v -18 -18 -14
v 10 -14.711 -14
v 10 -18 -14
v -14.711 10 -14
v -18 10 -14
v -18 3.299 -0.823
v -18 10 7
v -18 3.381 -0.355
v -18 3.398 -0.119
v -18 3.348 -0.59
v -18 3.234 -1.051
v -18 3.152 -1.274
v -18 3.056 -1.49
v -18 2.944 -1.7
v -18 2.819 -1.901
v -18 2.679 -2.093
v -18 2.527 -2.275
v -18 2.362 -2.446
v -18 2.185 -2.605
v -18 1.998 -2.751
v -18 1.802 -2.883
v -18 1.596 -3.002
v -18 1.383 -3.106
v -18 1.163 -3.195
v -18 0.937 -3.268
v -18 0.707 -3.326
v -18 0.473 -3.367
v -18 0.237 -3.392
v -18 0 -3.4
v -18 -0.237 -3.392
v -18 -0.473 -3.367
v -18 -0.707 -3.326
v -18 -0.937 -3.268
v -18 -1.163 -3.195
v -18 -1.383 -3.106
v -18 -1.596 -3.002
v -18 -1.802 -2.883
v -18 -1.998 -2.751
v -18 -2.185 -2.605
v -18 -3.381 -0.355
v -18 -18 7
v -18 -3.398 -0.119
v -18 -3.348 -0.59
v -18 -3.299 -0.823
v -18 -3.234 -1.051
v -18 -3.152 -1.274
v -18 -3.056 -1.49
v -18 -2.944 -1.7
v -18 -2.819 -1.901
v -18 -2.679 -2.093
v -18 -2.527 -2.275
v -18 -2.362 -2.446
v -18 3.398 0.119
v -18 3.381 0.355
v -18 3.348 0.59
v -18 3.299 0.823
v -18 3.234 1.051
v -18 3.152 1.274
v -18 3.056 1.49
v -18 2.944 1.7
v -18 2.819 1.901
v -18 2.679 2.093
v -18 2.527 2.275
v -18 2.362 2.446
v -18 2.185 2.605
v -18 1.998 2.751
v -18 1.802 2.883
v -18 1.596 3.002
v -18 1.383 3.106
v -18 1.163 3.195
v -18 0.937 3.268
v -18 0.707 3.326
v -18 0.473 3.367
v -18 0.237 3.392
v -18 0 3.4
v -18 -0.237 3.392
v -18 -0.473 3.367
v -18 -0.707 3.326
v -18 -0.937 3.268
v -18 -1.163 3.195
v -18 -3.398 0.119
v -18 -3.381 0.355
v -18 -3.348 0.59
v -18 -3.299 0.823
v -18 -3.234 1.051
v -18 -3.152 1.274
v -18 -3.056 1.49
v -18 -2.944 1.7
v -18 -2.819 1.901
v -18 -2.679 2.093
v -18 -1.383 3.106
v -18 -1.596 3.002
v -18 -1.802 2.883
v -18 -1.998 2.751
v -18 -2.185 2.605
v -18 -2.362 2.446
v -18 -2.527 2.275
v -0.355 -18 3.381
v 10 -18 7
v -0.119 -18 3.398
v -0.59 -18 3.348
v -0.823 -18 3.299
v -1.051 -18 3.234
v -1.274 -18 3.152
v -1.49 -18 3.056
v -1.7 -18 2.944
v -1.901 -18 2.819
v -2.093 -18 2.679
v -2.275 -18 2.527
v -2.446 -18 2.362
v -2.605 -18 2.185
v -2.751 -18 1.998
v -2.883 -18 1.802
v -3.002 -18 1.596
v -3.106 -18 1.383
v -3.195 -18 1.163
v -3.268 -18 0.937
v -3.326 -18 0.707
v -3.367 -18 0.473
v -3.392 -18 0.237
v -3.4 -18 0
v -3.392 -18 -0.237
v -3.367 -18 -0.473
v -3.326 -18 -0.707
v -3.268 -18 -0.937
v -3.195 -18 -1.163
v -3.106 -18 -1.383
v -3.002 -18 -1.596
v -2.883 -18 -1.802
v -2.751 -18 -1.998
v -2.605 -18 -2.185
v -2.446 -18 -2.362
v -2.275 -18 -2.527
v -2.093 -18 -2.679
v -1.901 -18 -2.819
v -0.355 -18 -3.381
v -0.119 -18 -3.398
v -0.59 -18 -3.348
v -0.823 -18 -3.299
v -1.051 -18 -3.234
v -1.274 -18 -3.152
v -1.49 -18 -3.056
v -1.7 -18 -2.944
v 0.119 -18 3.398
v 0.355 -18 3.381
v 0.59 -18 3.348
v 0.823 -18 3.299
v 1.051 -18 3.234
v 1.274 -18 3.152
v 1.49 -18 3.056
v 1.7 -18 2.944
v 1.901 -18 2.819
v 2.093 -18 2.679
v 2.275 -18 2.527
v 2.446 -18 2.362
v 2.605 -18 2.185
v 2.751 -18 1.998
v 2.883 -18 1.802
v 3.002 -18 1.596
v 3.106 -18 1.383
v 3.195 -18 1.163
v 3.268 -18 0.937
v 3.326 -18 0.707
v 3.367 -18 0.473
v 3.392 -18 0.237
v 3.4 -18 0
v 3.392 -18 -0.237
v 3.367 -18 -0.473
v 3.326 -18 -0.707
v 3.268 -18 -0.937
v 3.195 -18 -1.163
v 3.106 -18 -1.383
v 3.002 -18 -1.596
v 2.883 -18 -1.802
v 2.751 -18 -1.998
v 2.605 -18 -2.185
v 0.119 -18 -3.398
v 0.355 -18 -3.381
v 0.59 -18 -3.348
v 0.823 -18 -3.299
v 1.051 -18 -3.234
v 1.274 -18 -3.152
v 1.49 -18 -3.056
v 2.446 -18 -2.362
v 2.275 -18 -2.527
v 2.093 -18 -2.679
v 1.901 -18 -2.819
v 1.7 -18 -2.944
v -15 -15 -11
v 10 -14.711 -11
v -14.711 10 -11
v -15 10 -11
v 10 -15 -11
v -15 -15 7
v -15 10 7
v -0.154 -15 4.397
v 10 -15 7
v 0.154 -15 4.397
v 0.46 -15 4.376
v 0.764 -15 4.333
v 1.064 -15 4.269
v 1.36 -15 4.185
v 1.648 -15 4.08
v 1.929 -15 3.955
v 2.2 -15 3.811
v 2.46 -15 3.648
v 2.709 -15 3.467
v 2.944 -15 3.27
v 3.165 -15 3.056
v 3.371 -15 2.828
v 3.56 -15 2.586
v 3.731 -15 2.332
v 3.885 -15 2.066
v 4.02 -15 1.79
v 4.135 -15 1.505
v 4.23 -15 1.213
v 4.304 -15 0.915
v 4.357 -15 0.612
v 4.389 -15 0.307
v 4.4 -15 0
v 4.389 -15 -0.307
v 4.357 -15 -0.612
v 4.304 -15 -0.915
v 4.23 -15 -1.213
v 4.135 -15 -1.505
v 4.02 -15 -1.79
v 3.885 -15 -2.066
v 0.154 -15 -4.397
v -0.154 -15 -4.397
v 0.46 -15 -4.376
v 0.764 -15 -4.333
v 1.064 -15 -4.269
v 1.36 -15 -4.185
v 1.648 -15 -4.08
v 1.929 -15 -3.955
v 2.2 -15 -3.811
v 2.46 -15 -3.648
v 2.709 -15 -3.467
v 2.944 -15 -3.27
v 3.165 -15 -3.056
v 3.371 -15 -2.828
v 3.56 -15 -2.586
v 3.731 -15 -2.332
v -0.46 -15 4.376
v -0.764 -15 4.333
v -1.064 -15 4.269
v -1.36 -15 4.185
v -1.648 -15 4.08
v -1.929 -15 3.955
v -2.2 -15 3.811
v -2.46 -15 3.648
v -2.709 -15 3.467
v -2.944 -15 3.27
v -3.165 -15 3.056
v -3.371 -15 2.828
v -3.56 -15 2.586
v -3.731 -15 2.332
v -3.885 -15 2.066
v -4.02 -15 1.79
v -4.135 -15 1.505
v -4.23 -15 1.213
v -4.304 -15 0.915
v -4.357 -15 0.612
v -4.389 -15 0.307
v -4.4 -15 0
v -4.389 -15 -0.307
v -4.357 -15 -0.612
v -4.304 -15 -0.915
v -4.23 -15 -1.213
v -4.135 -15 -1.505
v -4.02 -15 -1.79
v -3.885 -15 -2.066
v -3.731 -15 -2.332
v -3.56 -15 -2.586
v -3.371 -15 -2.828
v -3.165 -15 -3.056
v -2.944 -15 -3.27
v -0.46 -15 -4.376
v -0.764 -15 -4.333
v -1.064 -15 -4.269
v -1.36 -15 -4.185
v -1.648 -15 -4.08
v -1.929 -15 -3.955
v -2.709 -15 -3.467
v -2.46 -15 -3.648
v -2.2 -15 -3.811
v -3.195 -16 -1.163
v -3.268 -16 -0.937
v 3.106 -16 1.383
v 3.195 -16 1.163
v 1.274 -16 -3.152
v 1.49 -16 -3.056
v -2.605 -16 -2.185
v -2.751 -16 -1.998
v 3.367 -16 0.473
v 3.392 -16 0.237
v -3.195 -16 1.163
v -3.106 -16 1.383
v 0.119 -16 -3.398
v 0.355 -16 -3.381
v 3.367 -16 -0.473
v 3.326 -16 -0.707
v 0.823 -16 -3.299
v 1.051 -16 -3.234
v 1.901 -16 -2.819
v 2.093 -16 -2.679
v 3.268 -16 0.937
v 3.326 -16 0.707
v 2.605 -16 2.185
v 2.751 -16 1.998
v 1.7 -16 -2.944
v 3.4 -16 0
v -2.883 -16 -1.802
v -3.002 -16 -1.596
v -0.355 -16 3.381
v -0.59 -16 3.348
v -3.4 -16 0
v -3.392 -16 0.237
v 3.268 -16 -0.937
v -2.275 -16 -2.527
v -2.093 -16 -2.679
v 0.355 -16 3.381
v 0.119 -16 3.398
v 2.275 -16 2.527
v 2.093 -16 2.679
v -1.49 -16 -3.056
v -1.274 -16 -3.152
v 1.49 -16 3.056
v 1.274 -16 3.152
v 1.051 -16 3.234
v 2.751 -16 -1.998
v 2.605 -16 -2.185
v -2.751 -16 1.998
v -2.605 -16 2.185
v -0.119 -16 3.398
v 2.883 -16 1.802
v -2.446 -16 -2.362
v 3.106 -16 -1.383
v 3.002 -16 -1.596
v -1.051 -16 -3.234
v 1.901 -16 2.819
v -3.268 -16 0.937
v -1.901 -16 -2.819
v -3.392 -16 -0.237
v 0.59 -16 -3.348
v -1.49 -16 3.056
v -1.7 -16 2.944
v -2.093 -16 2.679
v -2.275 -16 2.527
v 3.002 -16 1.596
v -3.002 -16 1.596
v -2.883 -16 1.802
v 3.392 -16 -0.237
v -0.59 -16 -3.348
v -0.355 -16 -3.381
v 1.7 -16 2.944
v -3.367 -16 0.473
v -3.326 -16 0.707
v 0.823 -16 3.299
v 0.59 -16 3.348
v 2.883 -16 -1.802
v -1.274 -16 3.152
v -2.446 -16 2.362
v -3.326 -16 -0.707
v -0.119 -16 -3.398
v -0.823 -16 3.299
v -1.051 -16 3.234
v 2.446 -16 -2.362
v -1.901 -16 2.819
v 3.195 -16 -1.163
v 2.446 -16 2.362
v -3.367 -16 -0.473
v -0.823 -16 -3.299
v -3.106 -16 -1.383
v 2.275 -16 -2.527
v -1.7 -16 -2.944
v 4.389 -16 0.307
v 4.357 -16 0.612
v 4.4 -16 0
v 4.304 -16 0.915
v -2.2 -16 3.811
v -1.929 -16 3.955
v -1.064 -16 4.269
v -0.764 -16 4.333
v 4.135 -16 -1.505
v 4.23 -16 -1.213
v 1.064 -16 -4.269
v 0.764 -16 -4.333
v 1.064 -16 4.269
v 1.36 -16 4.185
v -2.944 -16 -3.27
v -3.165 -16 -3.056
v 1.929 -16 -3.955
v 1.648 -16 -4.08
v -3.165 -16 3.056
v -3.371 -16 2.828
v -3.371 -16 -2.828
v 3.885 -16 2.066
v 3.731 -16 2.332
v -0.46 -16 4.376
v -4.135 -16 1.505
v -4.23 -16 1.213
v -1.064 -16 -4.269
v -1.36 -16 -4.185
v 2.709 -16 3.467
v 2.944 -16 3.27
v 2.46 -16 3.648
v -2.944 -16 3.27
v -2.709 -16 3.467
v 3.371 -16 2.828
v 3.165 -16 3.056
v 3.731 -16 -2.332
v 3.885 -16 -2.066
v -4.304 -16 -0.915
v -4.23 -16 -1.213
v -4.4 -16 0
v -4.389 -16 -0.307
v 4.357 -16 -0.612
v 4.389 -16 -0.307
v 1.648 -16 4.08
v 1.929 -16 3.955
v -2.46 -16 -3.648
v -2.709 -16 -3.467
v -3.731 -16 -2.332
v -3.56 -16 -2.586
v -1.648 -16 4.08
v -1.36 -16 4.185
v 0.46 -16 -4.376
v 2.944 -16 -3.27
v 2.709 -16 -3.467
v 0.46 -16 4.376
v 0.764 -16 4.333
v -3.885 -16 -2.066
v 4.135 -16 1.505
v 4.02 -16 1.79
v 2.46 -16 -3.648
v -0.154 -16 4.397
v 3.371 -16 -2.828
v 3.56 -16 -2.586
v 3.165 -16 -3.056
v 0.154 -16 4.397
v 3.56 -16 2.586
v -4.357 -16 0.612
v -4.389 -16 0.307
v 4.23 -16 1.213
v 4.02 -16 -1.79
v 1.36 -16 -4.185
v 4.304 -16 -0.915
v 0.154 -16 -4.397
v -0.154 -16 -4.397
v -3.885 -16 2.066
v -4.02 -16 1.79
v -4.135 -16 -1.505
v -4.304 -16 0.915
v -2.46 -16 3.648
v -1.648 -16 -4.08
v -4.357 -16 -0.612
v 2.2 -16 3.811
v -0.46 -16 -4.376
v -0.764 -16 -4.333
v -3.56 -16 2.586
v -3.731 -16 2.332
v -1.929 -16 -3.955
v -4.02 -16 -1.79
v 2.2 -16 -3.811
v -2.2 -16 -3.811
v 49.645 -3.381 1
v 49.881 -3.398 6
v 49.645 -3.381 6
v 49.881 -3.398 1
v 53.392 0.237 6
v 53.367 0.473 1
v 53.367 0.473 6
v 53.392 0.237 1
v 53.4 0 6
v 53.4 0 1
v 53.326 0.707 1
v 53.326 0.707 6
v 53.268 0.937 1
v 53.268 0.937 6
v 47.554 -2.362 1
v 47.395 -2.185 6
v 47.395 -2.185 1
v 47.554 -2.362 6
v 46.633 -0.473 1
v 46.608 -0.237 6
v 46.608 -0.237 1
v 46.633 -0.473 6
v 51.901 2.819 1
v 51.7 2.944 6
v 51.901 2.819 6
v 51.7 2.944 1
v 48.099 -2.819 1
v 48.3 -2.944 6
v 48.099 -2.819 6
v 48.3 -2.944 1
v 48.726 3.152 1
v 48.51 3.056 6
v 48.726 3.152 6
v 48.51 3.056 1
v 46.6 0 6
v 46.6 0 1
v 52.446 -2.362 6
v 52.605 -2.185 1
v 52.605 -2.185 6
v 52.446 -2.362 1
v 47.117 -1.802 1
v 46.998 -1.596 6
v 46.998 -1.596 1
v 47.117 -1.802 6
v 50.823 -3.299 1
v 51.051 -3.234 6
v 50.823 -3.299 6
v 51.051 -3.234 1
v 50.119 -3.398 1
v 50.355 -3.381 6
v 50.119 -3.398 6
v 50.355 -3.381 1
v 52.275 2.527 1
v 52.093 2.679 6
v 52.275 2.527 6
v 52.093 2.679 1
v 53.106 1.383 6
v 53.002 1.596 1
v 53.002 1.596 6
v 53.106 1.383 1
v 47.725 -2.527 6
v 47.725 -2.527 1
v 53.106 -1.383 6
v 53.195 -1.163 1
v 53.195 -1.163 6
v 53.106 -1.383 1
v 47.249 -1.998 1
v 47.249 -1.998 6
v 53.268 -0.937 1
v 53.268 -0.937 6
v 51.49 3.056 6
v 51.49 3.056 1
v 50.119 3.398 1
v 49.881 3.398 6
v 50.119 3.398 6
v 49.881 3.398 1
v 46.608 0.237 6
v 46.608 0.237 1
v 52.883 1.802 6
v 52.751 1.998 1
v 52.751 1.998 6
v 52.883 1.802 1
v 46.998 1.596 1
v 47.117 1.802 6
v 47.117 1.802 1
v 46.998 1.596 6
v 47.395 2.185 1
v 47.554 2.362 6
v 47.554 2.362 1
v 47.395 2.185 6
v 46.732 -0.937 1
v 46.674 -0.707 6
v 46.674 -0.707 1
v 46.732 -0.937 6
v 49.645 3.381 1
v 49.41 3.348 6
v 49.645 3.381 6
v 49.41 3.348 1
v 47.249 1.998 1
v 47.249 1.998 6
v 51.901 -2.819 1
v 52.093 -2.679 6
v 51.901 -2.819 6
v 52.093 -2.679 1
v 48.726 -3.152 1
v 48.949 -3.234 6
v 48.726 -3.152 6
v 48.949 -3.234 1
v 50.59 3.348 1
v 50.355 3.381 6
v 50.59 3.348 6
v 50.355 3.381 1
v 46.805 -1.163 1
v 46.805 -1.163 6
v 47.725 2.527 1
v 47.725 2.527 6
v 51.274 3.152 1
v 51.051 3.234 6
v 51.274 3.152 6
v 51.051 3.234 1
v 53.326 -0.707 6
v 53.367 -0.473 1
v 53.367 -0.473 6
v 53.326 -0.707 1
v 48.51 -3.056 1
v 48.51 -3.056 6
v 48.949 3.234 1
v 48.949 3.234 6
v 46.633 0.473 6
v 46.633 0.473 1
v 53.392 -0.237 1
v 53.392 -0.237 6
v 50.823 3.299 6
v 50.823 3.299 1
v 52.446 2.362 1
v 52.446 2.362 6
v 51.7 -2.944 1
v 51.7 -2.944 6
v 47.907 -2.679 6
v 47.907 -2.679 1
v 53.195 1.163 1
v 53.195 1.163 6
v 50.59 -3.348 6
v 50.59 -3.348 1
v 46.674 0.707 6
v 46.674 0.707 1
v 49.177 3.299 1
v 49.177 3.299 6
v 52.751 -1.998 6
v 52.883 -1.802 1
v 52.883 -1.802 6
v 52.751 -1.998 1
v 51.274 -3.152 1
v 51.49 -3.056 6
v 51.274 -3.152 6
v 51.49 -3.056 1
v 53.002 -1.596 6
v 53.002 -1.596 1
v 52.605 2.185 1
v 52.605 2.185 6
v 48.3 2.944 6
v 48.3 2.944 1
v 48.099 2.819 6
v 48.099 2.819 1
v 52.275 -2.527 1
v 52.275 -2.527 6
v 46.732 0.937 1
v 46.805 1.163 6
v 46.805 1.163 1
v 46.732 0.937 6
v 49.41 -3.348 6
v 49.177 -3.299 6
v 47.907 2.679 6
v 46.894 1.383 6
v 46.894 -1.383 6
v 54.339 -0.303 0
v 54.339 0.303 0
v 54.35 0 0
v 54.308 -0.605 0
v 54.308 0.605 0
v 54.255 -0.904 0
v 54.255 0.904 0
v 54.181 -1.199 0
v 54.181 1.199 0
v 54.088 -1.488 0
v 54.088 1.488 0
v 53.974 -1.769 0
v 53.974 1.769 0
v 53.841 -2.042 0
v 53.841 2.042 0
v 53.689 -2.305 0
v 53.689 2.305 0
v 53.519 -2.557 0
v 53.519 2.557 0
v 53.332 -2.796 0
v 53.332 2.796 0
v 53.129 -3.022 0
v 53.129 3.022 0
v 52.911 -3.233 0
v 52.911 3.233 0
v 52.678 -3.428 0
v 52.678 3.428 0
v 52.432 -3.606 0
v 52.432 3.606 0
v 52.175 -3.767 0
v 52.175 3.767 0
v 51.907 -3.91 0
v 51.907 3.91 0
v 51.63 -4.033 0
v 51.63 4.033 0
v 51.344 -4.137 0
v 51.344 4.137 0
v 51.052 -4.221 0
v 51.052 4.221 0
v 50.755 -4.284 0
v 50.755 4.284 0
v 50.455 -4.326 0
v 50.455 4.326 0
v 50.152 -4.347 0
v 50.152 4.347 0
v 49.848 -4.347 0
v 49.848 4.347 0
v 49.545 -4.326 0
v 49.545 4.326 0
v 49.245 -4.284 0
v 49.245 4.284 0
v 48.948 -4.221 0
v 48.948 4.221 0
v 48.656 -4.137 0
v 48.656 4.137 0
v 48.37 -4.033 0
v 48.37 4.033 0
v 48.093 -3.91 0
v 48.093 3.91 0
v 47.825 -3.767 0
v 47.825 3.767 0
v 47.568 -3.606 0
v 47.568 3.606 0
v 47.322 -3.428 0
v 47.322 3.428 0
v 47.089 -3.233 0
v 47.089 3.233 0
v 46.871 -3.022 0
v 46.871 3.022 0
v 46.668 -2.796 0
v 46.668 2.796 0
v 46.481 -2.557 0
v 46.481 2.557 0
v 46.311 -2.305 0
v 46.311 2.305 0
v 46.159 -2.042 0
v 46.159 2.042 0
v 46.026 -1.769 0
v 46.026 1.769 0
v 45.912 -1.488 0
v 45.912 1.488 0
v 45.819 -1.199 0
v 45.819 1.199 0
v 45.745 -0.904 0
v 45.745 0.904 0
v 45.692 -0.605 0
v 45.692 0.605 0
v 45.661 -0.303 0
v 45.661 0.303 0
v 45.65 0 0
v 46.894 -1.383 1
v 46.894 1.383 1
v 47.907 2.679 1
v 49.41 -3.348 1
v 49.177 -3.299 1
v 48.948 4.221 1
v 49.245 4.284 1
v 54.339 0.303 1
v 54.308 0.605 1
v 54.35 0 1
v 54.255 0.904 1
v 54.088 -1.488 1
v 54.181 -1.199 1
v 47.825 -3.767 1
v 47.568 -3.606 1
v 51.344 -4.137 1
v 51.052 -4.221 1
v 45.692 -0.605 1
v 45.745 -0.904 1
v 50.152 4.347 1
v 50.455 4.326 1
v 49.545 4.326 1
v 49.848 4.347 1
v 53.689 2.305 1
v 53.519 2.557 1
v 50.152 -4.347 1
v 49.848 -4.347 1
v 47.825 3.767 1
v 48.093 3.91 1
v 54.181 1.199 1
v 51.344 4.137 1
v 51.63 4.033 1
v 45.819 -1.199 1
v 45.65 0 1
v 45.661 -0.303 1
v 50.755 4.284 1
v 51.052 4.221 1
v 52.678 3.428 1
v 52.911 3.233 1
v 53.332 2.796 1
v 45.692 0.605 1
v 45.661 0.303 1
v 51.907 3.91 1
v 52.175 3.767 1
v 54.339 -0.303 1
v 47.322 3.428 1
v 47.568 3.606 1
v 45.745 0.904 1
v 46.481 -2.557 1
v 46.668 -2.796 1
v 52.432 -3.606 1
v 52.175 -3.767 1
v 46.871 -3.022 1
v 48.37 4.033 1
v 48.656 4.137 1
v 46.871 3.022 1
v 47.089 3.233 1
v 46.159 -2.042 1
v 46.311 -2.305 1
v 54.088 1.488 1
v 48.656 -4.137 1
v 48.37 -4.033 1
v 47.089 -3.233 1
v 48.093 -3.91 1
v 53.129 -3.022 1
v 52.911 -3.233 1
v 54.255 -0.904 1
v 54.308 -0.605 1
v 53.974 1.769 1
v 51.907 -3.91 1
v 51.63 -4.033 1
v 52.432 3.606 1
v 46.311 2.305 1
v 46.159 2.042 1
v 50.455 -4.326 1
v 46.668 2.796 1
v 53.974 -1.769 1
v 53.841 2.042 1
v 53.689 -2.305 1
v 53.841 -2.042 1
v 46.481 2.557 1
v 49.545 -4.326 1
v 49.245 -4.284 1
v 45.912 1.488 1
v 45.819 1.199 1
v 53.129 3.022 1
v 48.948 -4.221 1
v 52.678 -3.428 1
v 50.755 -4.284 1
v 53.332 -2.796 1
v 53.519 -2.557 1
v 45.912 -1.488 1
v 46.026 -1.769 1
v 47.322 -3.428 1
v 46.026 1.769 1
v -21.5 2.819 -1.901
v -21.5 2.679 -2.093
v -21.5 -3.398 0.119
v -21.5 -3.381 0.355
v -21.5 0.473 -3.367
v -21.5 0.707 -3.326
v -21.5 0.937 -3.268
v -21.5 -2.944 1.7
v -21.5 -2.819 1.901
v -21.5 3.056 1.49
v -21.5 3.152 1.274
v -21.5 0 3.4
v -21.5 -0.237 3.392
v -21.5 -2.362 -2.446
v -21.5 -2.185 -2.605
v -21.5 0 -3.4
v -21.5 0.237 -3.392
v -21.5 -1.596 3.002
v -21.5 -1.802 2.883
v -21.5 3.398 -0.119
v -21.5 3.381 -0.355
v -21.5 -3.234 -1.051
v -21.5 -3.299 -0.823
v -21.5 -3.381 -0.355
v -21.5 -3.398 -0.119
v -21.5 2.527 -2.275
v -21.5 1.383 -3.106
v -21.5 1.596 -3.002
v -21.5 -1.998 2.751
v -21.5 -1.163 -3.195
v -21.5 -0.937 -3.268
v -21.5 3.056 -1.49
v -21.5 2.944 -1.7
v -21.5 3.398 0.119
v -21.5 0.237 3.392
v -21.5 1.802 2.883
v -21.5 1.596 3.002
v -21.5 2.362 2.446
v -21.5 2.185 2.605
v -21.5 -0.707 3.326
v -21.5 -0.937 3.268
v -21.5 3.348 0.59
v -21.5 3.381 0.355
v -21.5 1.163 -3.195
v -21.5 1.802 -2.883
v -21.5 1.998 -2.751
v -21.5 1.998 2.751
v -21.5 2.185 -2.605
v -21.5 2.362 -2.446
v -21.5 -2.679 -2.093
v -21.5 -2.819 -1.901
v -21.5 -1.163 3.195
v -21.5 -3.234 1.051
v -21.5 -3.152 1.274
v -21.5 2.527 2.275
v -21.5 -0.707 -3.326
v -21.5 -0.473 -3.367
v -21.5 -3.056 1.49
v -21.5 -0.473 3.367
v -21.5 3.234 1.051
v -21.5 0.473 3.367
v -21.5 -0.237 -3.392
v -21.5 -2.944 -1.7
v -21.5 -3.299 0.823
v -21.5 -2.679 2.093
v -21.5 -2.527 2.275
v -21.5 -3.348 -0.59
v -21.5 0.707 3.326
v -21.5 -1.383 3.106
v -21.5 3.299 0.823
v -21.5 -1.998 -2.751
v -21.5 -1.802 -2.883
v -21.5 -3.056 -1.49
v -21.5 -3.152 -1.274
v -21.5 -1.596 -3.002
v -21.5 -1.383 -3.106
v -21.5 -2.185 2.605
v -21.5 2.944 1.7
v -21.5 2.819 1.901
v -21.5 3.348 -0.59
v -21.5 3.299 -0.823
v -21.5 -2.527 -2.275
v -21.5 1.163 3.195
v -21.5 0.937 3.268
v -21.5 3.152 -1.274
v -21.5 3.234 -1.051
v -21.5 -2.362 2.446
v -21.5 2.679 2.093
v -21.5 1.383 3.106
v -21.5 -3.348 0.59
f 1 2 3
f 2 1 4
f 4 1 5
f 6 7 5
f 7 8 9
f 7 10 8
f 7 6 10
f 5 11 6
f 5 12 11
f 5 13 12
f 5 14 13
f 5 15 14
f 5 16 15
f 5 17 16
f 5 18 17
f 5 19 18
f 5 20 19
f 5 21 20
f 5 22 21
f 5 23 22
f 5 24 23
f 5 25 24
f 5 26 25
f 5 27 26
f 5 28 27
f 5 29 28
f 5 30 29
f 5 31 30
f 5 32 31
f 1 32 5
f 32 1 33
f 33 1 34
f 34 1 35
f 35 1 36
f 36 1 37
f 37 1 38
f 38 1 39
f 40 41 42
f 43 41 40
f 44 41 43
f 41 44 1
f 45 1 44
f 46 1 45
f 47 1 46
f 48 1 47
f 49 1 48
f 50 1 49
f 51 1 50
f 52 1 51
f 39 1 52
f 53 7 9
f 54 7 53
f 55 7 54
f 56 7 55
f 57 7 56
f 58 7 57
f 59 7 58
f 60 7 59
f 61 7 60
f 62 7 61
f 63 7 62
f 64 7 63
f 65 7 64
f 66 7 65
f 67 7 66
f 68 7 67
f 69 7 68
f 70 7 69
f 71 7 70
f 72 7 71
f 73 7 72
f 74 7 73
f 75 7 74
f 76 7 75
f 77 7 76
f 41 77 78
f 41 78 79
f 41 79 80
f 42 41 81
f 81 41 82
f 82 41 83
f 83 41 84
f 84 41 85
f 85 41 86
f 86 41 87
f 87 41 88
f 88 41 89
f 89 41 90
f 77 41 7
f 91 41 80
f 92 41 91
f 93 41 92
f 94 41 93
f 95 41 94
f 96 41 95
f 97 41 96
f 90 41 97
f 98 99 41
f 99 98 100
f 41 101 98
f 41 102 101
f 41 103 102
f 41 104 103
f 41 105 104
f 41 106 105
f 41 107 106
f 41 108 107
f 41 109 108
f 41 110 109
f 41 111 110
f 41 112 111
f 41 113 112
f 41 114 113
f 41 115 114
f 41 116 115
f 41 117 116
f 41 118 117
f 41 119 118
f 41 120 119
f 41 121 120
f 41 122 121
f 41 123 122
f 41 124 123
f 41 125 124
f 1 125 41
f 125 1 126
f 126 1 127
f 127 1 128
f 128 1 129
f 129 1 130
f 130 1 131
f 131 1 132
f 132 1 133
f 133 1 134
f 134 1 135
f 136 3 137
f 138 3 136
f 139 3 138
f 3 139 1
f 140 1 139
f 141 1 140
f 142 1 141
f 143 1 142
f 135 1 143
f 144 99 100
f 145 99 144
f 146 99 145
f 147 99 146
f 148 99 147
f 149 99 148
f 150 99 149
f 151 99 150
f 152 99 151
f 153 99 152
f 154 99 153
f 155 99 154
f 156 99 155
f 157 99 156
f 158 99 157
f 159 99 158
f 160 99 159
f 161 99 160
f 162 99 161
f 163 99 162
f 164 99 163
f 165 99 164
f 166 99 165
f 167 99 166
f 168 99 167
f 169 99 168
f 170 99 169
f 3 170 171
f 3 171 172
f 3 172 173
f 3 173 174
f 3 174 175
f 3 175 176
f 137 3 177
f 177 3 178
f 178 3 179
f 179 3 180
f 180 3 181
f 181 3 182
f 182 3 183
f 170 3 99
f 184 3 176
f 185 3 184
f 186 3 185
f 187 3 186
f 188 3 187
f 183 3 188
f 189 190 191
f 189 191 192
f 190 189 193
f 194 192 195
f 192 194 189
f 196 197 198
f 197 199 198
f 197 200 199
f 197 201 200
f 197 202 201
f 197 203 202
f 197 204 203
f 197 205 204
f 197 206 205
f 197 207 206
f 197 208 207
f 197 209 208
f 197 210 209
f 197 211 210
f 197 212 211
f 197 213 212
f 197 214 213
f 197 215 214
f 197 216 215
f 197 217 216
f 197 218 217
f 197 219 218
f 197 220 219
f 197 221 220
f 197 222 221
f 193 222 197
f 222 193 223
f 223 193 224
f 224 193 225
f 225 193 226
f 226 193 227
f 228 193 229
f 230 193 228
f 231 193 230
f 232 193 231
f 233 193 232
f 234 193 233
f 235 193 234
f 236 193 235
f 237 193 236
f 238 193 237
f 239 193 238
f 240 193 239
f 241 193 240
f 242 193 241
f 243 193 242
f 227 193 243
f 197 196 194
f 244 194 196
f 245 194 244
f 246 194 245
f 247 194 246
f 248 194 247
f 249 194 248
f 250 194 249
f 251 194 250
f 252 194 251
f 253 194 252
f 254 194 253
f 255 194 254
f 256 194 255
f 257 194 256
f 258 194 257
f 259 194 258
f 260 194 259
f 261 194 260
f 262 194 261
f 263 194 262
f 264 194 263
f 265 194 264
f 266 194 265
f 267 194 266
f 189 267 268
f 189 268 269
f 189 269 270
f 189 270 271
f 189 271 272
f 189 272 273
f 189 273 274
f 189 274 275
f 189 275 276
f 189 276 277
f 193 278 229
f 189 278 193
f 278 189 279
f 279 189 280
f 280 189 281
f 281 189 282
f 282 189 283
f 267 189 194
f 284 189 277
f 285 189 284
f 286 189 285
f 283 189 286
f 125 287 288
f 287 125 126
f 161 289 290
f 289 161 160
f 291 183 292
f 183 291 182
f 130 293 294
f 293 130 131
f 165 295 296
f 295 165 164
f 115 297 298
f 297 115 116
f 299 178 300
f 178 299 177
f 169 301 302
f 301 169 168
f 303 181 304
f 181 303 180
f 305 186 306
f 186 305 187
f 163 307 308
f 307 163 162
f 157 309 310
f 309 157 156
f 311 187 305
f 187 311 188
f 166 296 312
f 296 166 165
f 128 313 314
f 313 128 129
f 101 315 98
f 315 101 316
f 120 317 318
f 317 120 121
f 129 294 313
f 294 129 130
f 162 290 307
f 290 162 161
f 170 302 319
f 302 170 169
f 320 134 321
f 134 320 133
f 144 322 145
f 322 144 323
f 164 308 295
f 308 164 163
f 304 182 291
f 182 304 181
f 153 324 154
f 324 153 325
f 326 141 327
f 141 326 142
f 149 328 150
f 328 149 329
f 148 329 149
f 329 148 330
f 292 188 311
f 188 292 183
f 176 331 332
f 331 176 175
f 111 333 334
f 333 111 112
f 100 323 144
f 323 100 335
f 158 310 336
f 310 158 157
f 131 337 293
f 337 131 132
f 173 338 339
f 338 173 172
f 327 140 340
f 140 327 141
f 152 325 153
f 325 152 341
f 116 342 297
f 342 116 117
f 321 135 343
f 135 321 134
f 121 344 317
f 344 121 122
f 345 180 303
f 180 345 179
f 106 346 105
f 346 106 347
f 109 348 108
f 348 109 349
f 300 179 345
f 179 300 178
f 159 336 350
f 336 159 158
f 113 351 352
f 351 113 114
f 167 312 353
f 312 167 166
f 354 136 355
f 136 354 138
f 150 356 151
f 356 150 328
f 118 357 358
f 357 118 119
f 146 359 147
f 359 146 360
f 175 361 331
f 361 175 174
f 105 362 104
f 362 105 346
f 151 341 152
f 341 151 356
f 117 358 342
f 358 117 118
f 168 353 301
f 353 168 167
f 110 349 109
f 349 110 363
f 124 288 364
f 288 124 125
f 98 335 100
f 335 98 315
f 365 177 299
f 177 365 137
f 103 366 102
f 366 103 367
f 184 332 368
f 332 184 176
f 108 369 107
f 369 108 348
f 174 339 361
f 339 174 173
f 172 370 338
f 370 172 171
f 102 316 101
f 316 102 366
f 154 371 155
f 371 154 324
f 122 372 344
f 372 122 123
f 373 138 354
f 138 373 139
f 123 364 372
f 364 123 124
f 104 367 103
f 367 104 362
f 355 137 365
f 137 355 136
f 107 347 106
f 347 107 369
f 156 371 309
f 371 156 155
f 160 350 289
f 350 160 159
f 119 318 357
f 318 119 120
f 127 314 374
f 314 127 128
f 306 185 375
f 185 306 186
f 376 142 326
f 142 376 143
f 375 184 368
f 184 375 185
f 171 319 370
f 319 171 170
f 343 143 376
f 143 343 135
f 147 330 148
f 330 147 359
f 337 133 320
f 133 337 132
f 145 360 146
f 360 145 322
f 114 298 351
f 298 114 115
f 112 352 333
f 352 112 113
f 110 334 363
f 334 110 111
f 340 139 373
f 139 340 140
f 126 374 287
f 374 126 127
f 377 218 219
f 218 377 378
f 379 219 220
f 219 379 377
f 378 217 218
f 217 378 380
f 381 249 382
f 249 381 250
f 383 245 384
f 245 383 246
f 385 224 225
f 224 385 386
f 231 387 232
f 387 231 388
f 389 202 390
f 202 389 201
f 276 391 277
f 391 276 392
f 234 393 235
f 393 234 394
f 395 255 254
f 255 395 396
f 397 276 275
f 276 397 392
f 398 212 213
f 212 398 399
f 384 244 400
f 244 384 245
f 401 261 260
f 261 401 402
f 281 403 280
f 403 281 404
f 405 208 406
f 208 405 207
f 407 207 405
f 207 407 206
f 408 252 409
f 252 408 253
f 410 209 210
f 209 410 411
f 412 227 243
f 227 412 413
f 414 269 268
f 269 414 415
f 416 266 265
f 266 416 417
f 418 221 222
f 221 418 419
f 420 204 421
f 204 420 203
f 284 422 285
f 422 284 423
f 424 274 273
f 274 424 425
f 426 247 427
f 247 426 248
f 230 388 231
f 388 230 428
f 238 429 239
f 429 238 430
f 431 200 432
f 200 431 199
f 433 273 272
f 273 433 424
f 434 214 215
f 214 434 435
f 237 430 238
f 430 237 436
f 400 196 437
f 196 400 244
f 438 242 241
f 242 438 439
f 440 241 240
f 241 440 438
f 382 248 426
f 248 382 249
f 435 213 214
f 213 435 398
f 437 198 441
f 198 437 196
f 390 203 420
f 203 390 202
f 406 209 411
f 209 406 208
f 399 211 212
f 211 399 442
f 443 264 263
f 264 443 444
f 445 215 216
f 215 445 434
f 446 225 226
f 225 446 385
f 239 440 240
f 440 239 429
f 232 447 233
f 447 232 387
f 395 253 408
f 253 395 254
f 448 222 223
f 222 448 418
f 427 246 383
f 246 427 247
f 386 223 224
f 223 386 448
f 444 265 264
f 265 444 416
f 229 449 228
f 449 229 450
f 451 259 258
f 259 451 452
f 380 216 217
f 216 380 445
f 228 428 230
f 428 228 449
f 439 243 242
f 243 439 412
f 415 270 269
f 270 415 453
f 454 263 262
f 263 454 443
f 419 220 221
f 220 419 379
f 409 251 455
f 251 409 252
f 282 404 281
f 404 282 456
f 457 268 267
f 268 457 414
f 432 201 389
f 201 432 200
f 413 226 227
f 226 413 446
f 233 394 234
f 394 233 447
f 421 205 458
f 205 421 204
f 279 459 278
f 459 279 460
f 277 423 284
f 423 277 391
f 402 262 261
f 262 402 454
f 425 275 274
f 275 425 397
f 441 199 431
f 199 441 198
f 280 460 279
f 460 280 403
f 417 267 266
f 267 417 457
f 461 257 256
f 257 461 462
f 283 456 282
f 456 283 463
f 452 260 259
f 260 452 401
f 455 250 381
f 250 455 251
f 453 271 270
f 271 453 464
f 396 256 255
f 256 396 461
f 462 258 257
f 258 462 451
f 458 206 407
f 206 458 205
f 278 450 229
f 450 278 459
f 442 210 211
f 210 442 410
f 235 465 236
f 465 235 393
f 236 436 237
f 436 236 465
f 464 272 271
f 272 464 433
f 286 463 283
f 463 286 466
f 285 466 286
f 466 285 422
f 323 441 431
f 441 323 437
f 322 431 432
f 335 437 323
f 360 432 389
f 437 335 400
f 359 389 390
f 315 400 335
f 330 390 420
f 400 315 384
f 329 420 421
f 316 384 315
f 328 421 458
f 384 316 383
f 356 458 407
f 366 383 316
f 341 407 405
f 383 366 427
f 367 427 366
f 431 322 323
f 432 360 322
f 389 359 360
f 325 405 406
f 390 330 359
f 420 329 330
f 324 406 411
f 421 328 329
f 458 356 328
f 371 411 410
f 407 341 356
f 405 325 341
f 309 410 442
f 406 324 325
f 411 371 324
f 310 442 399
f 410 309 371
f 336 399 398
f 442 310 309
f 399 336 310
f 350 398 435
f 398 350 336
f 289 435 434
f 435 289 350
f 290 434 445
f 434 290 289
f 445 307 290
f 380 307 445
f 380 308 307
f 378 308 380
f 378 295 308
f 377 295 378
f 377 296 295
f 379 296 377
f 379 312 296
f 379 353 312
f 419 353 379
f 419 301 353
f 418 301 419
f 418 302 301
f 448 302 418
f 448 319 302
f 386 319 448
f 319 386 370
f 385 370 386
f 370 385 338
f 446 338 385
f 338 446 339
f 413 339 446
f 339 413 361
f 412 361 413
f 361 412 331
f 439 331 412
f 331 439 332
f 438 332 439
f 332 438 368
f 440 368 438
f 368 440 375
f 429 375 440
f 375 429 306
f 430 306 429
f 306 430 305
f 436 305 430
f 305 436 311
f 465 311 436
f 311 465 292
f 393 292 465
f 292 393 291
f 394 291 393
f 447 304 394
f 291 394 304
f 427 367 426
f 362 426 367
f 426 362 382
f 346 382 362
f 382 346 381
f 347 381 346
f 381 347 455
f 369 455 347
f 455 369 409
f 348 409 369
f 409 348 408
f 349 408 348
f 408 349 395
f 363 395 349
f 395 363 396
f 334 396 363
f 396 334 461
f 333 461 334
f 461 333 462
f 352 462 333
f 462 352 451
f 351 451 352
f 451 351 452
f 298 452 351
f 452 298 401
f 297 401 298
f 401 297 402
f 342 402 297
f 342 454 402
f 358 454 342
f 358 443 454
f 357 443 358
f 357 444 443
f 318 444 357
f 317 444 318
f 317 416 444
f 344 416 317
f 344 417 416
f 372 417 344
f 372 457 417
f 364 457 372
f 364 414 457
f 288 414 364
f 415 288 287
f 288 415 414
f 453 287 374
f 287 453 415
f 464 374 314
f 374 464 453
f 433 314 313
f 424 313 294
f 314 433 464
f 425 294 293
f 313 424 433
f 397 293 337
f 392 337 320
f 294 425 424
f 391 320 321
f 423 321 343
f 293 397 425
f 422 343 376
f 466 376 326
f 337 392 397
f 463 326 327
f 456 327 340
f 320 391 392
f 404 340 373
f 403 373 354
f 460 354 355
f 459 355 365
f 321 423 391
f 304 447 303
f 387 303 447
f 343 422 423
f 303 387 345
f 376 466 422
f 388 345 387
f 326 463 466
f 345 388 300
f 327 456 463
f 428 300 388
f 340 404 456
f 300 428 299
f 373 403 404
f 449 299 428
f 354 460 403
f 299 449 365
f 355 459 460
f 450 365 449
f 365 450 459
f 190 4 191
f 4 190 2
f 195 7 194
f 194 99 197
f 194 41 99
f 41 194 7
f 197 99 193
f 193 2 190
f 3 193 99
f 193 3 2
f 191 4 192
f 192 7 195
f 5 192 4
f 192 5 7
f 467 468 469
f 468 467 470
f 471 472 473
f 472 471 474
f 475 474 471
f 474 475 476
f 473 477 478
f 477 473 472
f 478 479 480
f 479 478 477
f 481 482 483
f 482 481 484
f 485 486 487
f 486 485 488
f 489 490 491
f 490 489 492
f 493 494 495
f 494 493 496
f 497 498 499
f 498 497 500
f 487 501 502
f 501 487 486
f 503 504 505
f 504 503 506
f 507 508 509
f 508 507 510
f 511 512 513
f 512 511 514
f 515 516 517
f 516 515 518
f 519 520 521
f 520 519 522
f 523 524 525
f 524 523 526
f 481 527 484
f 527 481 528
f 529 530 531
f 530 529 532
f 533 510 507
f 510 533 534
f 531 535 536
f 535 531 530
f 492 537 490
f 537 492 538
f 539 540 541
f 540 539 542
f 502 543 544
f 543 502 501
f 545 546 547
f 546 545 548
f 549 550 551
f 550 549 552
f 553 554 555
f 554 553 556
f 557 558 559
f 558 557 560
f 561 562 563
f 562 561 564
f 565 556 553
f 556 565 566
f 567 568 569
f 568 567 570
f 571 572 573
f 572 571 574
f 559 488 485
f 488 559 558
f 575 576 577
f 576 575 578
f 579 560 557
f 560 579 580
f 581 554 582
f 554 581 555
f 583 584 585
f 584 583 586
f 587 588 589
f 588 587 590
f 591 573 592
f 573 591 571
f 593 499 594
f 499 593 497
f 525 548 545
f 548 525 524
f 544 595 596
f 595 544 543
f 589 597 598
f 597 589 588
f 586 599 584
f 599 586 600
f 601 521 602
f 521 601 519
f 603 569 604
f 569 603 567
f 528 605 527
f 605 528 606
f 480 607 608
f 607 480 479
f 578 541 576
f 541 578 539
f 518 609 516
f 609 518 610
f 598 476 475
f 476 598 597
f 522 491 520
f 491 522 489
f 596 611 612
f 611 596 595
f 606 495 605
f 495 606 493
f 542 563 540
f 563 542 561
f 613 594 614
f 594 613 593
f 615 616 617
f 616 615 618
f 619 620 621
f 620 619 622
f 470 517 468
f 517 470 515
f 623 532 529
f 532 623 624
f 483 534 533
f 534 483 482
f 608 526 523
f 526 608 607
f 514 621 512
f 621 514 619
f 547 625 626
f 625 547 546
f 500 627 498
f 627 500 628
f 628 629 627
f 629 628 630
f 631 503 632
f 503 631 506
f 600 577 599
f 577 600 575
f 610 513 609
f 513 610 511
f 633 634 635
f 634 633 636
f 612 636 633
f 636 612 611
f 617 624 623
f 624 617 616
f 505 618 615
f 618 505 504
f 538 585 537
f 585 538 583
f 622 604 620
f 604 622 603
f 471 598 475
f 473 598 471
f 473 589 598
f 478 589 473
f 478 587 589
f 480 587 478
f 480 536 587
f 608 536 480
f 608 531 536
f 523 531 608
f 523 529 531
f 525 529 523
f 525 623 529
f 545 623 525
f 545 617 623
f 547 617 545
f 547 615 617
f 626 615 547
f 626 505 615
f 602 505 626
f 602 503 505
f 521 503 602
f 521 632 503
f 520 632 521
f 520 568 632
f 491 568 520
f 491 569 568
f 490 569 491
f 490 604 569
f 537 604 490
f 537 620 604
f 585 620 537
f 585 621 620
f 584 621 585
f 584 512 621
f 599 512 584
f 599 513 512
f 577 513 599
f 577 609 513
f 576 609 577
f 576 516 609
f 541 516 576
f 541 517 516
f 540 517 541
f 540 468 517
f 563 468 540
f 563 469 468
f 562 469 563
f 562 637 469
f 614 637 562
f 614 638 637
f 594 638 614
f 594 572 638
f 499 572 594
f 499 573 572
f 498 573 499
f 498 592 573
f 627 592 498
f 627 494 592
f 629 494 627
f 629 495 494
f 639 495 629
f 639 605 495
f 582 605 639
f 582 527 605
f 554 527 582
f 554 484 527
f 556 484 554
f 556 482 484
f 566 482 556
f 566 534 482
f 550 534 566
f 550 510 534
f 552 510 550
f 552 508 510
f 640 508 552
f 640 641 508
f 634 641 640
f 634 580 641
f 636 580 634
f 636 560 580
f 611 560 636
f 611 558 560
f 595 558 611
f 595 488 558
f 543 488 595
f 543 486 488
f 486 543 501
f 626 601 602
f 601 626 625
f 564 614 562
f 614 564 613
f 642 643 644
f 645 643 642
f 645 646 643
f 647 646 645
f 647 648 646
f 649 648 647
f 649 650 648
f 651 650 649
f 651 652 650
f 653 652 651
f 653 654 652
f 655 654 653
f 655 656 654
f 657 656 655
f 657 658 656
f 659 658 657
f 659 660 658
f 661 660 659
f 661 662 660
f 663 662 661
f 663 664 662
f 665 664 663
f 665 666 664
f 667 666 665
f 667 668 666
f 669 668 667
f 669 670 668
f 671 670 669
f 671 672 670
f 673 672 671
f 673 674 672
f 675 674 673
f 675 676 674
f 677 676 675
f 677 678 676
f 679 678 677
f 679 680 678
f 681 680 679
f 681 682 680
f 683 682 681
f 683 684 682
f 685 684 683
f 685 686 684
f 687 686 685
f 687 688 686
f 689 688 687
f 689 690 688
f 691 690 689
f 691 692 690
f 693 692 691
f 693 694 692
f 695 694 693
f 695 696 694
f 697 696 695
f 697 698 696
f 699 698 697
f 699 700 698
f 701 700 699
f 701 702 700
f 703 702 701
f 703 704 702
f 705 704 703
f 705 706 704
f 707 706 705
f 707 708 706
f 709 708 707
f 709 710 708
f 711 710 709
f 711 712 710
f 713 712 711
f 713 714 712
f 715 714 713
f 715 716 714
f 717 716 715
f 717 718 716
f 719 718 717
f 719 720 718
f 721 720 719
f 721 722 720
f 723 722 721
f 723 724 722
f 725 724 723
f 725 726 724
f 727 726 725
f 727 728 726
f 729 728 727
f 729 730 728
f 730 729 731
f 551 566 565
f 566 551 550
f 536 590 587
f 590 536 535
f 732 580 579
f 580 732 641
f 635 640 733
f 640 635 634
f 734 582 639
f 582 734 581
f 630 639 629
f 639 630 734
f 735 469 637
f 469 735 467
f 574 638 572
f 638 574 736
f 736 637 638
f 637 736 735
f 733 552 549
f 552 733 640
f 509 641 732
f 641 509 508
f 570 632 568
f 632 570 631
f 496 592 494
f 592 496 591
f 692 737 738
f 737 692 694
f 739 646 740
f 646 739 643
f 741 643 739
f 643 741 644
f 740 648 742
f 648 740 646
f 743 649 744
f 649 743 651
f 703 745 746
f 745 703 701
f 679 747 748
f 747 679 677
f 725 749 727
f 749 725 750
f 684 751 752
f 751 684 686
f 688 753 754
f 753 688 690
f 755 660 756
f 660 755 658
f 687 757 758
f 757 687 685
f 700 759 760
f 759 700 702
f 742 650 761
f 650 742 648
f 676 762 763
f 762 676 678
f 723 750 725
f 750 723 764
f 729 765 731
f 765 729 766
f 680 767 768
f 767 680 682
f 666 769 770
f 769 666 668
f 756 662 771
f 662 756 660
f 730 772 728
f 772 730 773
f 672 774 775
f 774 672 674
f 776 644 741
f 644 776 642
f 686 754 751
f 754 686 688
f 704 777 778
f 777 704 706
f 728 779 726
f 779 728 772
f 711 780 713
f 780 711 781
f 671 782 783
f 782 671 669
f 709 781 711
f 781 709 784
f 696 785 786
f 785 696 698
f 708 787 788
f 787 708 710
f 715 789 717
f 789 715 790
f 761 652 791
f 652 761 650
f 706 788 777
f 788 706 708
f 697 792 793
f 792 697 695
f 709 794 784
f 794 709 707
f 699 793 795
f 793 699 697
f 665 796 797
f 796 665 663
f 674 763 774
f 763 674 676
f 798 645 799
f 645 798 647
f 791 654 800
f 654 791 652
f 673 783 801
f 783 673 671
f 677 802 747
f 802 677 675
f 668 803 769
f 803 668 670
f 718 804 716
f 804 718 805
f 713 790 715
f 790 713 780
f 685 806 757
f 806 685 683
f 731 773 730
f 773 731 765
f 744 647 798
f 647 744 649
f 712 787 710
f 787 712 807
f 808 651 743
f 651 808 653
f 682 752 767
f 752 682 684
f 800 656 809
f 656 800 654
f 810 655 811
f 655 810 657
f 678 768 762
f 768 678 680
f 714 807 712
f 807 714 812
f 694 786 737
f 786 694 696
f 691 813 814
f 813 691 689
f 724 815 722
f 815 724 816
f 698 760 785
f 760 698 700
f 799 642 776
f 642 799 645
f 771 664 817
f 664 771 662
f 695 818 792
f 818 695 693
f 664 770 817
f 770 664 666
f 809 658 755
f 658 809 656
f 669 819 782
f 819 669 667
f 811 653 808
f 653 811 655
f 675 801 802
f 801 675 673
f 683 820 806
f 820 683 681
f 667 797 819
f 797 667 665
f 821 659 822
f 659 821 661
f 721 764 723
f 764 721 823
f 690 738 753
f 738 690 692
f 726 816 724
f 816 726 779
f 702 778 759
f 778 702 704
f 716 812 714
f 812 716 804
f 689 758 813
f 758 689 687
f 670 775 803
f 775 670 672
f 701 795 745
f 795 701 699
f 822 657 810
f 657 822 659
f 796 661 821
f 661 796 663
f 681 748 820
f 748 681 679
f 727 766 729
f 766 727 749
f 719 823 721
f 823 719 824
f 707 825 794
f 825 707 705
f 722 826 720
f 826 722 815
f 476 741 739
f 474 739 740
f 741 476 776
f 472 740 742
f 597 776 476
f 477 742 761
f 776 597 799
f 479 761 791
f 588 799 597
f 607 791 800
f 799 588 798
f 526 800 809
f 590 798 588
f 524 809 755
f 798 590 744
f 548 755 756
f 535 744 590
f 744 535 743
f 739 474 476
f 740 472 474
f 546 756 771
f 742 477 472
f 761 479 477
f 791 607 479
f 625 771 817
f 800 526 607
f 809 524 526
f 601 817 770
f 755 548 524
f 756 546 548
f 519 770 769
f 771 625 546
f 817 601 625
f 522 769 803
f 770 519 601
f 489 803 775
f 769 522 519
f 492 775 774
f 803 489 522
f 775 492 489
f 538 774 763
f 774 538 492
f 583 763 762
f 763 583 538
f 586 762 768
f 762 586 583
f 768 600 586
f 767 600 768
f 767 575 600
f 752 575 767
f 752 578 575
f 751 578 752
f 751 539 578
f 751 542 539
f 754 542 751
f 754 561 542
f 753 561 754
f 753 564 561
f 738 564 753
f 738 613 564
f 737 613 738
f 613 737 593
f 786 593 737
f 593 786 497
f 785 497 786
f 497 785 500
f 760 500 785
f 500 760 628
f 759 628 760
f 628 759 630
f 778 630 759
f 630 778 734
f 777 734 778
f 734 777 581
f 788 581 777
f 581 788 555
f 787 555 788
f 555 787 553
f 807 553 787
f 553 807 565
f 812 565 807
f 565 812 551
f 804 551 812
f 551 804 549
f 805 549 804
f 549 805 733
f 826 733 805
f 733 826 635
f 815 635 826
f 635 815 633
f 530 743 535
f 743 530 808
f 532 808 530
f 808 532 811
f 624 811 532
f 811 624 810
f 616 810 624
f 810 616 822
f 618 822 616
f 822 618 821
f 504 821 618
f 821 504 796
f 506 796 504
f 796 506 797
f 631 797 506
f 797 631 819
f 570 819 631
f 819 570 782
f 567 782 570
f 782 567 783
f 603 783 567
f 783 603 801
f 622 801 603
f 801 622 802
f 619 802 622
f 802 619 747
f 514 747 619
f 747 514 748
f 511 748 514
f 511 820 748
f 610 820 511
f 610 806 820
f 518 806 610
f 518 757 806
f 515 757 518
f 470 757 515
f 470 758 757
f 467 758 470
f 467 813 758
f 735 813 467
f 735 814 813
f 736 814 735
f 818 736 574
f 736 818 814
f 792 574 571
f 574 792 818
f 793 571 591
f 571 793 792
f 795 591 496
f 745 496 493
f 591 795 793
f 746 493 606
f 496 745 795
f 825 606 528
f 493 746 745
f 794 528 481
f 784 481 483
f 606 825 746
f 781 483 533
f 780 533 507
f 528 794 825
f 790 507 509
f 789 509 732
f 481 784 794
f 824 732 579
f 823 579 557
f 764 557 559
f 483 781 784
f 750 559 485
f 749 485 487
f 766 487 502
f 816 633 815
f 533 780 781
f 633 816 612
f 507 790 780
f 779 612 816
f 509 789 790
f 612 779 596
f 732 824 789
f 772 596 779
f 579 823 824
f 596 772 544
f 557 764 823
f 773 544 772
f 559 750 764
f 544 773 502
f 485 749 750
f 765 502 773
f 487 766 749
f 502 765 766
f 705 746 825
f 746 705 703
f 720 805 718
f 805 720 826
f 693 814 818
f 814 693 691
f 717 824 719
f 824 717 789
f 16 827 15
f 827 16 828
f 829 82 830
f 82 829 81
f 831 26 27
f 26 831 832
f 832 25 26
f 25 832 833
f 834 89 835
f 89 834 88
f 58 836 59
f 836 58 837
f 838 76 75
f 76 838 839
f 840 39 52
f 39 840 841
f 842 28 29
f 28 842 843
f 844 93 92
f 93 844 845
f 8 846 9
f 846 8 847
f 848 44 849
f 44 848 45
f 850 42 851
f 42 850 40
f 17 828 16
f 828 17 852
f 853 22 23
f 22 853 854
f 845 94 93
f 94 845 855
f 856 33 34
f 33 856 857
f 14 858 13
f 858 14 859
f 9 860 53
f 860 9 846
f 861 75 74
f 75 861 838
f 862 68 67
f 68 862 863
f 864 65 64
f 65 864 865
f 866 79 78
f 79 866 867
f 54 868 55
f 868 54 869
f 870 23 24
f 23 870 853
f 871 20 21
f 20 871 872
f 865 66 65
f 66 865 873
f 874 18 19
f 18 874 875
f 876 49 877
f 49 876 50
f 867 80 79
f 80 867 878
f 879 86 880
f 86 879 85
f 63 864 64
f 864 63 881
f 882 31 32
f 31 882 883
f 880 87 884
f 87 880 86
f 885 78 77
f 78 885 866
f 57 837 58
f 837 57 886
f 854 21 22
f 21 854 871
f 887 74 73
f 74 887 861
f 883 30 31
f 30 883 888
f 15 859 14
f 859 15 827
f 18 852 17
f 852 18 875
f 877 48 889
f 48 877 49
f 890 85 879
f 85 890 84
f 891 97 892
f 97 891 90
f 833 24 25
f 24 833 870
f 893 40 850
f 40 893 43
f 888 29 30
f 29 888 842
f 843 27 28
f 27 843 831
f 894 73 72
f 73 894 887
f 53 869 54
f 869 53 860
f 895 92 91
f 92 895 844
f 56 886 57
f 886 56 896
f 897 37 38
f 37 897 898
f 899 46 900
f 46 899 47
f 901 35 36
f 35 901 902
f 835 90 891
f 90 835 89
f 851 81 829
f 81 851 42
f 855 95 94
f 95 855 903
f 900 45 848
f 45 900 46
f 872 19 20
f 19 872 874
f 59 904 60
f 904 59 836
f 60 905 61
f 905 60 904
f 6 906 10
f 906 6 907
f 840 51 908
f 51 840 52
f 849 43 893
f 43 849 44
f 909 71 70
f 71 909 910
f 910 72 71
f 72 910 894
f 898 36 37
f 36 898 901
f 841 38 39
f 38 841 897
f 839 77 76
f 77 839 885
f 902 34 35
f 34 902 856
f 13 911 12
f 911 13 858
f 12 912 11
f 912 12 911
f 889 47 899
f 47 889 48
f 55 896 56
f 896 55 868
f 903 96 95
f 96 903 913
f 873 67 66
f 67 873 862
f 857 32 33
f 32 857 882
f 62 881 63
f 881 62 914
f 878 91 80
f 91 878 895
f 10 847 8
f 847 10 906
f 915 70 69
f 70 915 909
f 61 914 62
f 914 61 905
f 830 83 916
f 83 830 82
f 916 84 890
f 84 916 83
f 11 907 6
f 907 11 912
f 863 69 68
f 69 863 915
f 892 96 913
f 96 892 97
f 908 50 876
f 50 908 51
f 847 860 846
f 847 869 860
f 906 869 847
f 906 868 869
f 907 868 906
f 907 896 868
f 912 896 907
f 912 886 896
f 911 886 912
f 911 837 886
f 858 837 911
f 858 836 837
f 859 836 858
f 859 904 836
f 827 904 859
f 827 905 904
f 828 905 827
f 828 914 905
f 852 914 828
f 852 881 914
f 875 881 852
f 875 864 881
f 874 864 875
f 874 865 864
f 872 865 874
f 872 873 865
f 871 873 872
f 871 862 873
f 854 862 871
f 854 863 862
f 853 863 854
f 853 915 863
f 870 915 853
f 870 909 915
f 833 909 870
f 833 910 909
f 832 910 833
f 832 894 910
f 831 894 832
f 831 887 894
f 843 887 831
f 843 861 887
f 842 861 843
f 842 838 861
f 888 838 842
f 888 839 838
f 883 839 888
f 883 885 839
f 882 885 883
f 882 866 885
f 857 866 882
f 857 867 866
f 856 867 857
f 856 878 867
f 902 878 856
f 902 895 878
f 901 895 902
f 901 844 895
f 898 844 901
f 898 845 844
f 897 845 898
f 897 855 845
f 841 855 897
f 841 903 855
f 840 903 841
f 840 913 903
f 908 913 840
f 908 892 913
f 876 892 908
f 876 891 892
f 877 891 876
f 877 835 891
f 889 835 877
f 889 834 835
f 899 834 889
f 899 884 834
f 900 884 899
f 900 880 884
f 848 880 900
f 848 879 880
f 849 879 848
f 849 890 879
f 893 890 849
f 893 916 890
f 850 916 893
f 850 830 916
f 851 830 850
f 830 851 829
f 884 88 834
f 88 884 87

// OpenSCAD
/*
 * Kovona Drumy Shelf Support Peg
 *
 * Author: Pavel Rampas
 * Version: 1.0.0 (Changelog is at the bottom)
 * License: CC BY-SA 4.0 [https://creativecommons.org/licenses/by-sa/4.0/]
 * Link: https://github.com/pavelrampas/openscad-models
 *
 * OpenSCAD version: 2019.05
 *
 * Instructions:
 * Set up parameters, render and print.
 *
 * Height is layer.
 * Thickness is perimeter.
 */

// Parameters
//------------------------------------------------------------------------------

$fn = $preview ? 15 : 90;

// Code
//------------------------------------------------------------------------------

difference() {
    // cube
    cube([36, 36, 28], center = true);
    translate([3, 3, 3]) {
        cube([36, 36, 28], center = true);
    }

    // hole
    translate([0, -37/2, 0]) {
        rotate(a = [90, 0, 0]) {
            cylinder(h = 37, d1 = 6.8, d2 = 6.8, center = true);
        }
    }

    // hole
    translate([0, 2, 0]) {
        rotate(a = [90, 0, 0]) {
            cylinder(h = 36, d1 = 8.8, d2 = 8.8, center = true);
        }
    }

    // cut corner
    translate([33, 33, 0]) {
        rotate(a = [0, 0, 45]) {
            cube([100, 100, 100], center = true);
        }
    }

    // cut top
    translate([0, 0, 57]) {
        cube([100, 100, 100], center = true);
    }

    // cut walls
    translate([60, 0, 0]) {
        cube([100, 100, 100], center = true);
    }
    translate([0, 60, 0]) {
        cube( [100, 100, 100], center = true);
    }
}


// stump
translate([-37/2, 0, 0]) {
    rotate([0, 90, 0]) {
        cylinder(h = 6, d1 = 6.8, d2 = 6.8, center = true);
    }
}

// plug
translate([50, 0, 0]) {
    rotate([0, 0, 0]) {
        cylinder(h = 6, d1 = 6.8, d2 = 6.8, center = false);
    }
    rotate(a = [0, 0, 0]) {
        cylinder(h = 1, d1 = 8.7, d2 = 8.7, center = false);
    }
}

// Functions
//------------------------------------------------------------------------------


// Modules
//------------------------------------------------------------------------------


// Changelog
//------------------------------------------------------------------------------

// [1.0.0]:
// Initial release.
